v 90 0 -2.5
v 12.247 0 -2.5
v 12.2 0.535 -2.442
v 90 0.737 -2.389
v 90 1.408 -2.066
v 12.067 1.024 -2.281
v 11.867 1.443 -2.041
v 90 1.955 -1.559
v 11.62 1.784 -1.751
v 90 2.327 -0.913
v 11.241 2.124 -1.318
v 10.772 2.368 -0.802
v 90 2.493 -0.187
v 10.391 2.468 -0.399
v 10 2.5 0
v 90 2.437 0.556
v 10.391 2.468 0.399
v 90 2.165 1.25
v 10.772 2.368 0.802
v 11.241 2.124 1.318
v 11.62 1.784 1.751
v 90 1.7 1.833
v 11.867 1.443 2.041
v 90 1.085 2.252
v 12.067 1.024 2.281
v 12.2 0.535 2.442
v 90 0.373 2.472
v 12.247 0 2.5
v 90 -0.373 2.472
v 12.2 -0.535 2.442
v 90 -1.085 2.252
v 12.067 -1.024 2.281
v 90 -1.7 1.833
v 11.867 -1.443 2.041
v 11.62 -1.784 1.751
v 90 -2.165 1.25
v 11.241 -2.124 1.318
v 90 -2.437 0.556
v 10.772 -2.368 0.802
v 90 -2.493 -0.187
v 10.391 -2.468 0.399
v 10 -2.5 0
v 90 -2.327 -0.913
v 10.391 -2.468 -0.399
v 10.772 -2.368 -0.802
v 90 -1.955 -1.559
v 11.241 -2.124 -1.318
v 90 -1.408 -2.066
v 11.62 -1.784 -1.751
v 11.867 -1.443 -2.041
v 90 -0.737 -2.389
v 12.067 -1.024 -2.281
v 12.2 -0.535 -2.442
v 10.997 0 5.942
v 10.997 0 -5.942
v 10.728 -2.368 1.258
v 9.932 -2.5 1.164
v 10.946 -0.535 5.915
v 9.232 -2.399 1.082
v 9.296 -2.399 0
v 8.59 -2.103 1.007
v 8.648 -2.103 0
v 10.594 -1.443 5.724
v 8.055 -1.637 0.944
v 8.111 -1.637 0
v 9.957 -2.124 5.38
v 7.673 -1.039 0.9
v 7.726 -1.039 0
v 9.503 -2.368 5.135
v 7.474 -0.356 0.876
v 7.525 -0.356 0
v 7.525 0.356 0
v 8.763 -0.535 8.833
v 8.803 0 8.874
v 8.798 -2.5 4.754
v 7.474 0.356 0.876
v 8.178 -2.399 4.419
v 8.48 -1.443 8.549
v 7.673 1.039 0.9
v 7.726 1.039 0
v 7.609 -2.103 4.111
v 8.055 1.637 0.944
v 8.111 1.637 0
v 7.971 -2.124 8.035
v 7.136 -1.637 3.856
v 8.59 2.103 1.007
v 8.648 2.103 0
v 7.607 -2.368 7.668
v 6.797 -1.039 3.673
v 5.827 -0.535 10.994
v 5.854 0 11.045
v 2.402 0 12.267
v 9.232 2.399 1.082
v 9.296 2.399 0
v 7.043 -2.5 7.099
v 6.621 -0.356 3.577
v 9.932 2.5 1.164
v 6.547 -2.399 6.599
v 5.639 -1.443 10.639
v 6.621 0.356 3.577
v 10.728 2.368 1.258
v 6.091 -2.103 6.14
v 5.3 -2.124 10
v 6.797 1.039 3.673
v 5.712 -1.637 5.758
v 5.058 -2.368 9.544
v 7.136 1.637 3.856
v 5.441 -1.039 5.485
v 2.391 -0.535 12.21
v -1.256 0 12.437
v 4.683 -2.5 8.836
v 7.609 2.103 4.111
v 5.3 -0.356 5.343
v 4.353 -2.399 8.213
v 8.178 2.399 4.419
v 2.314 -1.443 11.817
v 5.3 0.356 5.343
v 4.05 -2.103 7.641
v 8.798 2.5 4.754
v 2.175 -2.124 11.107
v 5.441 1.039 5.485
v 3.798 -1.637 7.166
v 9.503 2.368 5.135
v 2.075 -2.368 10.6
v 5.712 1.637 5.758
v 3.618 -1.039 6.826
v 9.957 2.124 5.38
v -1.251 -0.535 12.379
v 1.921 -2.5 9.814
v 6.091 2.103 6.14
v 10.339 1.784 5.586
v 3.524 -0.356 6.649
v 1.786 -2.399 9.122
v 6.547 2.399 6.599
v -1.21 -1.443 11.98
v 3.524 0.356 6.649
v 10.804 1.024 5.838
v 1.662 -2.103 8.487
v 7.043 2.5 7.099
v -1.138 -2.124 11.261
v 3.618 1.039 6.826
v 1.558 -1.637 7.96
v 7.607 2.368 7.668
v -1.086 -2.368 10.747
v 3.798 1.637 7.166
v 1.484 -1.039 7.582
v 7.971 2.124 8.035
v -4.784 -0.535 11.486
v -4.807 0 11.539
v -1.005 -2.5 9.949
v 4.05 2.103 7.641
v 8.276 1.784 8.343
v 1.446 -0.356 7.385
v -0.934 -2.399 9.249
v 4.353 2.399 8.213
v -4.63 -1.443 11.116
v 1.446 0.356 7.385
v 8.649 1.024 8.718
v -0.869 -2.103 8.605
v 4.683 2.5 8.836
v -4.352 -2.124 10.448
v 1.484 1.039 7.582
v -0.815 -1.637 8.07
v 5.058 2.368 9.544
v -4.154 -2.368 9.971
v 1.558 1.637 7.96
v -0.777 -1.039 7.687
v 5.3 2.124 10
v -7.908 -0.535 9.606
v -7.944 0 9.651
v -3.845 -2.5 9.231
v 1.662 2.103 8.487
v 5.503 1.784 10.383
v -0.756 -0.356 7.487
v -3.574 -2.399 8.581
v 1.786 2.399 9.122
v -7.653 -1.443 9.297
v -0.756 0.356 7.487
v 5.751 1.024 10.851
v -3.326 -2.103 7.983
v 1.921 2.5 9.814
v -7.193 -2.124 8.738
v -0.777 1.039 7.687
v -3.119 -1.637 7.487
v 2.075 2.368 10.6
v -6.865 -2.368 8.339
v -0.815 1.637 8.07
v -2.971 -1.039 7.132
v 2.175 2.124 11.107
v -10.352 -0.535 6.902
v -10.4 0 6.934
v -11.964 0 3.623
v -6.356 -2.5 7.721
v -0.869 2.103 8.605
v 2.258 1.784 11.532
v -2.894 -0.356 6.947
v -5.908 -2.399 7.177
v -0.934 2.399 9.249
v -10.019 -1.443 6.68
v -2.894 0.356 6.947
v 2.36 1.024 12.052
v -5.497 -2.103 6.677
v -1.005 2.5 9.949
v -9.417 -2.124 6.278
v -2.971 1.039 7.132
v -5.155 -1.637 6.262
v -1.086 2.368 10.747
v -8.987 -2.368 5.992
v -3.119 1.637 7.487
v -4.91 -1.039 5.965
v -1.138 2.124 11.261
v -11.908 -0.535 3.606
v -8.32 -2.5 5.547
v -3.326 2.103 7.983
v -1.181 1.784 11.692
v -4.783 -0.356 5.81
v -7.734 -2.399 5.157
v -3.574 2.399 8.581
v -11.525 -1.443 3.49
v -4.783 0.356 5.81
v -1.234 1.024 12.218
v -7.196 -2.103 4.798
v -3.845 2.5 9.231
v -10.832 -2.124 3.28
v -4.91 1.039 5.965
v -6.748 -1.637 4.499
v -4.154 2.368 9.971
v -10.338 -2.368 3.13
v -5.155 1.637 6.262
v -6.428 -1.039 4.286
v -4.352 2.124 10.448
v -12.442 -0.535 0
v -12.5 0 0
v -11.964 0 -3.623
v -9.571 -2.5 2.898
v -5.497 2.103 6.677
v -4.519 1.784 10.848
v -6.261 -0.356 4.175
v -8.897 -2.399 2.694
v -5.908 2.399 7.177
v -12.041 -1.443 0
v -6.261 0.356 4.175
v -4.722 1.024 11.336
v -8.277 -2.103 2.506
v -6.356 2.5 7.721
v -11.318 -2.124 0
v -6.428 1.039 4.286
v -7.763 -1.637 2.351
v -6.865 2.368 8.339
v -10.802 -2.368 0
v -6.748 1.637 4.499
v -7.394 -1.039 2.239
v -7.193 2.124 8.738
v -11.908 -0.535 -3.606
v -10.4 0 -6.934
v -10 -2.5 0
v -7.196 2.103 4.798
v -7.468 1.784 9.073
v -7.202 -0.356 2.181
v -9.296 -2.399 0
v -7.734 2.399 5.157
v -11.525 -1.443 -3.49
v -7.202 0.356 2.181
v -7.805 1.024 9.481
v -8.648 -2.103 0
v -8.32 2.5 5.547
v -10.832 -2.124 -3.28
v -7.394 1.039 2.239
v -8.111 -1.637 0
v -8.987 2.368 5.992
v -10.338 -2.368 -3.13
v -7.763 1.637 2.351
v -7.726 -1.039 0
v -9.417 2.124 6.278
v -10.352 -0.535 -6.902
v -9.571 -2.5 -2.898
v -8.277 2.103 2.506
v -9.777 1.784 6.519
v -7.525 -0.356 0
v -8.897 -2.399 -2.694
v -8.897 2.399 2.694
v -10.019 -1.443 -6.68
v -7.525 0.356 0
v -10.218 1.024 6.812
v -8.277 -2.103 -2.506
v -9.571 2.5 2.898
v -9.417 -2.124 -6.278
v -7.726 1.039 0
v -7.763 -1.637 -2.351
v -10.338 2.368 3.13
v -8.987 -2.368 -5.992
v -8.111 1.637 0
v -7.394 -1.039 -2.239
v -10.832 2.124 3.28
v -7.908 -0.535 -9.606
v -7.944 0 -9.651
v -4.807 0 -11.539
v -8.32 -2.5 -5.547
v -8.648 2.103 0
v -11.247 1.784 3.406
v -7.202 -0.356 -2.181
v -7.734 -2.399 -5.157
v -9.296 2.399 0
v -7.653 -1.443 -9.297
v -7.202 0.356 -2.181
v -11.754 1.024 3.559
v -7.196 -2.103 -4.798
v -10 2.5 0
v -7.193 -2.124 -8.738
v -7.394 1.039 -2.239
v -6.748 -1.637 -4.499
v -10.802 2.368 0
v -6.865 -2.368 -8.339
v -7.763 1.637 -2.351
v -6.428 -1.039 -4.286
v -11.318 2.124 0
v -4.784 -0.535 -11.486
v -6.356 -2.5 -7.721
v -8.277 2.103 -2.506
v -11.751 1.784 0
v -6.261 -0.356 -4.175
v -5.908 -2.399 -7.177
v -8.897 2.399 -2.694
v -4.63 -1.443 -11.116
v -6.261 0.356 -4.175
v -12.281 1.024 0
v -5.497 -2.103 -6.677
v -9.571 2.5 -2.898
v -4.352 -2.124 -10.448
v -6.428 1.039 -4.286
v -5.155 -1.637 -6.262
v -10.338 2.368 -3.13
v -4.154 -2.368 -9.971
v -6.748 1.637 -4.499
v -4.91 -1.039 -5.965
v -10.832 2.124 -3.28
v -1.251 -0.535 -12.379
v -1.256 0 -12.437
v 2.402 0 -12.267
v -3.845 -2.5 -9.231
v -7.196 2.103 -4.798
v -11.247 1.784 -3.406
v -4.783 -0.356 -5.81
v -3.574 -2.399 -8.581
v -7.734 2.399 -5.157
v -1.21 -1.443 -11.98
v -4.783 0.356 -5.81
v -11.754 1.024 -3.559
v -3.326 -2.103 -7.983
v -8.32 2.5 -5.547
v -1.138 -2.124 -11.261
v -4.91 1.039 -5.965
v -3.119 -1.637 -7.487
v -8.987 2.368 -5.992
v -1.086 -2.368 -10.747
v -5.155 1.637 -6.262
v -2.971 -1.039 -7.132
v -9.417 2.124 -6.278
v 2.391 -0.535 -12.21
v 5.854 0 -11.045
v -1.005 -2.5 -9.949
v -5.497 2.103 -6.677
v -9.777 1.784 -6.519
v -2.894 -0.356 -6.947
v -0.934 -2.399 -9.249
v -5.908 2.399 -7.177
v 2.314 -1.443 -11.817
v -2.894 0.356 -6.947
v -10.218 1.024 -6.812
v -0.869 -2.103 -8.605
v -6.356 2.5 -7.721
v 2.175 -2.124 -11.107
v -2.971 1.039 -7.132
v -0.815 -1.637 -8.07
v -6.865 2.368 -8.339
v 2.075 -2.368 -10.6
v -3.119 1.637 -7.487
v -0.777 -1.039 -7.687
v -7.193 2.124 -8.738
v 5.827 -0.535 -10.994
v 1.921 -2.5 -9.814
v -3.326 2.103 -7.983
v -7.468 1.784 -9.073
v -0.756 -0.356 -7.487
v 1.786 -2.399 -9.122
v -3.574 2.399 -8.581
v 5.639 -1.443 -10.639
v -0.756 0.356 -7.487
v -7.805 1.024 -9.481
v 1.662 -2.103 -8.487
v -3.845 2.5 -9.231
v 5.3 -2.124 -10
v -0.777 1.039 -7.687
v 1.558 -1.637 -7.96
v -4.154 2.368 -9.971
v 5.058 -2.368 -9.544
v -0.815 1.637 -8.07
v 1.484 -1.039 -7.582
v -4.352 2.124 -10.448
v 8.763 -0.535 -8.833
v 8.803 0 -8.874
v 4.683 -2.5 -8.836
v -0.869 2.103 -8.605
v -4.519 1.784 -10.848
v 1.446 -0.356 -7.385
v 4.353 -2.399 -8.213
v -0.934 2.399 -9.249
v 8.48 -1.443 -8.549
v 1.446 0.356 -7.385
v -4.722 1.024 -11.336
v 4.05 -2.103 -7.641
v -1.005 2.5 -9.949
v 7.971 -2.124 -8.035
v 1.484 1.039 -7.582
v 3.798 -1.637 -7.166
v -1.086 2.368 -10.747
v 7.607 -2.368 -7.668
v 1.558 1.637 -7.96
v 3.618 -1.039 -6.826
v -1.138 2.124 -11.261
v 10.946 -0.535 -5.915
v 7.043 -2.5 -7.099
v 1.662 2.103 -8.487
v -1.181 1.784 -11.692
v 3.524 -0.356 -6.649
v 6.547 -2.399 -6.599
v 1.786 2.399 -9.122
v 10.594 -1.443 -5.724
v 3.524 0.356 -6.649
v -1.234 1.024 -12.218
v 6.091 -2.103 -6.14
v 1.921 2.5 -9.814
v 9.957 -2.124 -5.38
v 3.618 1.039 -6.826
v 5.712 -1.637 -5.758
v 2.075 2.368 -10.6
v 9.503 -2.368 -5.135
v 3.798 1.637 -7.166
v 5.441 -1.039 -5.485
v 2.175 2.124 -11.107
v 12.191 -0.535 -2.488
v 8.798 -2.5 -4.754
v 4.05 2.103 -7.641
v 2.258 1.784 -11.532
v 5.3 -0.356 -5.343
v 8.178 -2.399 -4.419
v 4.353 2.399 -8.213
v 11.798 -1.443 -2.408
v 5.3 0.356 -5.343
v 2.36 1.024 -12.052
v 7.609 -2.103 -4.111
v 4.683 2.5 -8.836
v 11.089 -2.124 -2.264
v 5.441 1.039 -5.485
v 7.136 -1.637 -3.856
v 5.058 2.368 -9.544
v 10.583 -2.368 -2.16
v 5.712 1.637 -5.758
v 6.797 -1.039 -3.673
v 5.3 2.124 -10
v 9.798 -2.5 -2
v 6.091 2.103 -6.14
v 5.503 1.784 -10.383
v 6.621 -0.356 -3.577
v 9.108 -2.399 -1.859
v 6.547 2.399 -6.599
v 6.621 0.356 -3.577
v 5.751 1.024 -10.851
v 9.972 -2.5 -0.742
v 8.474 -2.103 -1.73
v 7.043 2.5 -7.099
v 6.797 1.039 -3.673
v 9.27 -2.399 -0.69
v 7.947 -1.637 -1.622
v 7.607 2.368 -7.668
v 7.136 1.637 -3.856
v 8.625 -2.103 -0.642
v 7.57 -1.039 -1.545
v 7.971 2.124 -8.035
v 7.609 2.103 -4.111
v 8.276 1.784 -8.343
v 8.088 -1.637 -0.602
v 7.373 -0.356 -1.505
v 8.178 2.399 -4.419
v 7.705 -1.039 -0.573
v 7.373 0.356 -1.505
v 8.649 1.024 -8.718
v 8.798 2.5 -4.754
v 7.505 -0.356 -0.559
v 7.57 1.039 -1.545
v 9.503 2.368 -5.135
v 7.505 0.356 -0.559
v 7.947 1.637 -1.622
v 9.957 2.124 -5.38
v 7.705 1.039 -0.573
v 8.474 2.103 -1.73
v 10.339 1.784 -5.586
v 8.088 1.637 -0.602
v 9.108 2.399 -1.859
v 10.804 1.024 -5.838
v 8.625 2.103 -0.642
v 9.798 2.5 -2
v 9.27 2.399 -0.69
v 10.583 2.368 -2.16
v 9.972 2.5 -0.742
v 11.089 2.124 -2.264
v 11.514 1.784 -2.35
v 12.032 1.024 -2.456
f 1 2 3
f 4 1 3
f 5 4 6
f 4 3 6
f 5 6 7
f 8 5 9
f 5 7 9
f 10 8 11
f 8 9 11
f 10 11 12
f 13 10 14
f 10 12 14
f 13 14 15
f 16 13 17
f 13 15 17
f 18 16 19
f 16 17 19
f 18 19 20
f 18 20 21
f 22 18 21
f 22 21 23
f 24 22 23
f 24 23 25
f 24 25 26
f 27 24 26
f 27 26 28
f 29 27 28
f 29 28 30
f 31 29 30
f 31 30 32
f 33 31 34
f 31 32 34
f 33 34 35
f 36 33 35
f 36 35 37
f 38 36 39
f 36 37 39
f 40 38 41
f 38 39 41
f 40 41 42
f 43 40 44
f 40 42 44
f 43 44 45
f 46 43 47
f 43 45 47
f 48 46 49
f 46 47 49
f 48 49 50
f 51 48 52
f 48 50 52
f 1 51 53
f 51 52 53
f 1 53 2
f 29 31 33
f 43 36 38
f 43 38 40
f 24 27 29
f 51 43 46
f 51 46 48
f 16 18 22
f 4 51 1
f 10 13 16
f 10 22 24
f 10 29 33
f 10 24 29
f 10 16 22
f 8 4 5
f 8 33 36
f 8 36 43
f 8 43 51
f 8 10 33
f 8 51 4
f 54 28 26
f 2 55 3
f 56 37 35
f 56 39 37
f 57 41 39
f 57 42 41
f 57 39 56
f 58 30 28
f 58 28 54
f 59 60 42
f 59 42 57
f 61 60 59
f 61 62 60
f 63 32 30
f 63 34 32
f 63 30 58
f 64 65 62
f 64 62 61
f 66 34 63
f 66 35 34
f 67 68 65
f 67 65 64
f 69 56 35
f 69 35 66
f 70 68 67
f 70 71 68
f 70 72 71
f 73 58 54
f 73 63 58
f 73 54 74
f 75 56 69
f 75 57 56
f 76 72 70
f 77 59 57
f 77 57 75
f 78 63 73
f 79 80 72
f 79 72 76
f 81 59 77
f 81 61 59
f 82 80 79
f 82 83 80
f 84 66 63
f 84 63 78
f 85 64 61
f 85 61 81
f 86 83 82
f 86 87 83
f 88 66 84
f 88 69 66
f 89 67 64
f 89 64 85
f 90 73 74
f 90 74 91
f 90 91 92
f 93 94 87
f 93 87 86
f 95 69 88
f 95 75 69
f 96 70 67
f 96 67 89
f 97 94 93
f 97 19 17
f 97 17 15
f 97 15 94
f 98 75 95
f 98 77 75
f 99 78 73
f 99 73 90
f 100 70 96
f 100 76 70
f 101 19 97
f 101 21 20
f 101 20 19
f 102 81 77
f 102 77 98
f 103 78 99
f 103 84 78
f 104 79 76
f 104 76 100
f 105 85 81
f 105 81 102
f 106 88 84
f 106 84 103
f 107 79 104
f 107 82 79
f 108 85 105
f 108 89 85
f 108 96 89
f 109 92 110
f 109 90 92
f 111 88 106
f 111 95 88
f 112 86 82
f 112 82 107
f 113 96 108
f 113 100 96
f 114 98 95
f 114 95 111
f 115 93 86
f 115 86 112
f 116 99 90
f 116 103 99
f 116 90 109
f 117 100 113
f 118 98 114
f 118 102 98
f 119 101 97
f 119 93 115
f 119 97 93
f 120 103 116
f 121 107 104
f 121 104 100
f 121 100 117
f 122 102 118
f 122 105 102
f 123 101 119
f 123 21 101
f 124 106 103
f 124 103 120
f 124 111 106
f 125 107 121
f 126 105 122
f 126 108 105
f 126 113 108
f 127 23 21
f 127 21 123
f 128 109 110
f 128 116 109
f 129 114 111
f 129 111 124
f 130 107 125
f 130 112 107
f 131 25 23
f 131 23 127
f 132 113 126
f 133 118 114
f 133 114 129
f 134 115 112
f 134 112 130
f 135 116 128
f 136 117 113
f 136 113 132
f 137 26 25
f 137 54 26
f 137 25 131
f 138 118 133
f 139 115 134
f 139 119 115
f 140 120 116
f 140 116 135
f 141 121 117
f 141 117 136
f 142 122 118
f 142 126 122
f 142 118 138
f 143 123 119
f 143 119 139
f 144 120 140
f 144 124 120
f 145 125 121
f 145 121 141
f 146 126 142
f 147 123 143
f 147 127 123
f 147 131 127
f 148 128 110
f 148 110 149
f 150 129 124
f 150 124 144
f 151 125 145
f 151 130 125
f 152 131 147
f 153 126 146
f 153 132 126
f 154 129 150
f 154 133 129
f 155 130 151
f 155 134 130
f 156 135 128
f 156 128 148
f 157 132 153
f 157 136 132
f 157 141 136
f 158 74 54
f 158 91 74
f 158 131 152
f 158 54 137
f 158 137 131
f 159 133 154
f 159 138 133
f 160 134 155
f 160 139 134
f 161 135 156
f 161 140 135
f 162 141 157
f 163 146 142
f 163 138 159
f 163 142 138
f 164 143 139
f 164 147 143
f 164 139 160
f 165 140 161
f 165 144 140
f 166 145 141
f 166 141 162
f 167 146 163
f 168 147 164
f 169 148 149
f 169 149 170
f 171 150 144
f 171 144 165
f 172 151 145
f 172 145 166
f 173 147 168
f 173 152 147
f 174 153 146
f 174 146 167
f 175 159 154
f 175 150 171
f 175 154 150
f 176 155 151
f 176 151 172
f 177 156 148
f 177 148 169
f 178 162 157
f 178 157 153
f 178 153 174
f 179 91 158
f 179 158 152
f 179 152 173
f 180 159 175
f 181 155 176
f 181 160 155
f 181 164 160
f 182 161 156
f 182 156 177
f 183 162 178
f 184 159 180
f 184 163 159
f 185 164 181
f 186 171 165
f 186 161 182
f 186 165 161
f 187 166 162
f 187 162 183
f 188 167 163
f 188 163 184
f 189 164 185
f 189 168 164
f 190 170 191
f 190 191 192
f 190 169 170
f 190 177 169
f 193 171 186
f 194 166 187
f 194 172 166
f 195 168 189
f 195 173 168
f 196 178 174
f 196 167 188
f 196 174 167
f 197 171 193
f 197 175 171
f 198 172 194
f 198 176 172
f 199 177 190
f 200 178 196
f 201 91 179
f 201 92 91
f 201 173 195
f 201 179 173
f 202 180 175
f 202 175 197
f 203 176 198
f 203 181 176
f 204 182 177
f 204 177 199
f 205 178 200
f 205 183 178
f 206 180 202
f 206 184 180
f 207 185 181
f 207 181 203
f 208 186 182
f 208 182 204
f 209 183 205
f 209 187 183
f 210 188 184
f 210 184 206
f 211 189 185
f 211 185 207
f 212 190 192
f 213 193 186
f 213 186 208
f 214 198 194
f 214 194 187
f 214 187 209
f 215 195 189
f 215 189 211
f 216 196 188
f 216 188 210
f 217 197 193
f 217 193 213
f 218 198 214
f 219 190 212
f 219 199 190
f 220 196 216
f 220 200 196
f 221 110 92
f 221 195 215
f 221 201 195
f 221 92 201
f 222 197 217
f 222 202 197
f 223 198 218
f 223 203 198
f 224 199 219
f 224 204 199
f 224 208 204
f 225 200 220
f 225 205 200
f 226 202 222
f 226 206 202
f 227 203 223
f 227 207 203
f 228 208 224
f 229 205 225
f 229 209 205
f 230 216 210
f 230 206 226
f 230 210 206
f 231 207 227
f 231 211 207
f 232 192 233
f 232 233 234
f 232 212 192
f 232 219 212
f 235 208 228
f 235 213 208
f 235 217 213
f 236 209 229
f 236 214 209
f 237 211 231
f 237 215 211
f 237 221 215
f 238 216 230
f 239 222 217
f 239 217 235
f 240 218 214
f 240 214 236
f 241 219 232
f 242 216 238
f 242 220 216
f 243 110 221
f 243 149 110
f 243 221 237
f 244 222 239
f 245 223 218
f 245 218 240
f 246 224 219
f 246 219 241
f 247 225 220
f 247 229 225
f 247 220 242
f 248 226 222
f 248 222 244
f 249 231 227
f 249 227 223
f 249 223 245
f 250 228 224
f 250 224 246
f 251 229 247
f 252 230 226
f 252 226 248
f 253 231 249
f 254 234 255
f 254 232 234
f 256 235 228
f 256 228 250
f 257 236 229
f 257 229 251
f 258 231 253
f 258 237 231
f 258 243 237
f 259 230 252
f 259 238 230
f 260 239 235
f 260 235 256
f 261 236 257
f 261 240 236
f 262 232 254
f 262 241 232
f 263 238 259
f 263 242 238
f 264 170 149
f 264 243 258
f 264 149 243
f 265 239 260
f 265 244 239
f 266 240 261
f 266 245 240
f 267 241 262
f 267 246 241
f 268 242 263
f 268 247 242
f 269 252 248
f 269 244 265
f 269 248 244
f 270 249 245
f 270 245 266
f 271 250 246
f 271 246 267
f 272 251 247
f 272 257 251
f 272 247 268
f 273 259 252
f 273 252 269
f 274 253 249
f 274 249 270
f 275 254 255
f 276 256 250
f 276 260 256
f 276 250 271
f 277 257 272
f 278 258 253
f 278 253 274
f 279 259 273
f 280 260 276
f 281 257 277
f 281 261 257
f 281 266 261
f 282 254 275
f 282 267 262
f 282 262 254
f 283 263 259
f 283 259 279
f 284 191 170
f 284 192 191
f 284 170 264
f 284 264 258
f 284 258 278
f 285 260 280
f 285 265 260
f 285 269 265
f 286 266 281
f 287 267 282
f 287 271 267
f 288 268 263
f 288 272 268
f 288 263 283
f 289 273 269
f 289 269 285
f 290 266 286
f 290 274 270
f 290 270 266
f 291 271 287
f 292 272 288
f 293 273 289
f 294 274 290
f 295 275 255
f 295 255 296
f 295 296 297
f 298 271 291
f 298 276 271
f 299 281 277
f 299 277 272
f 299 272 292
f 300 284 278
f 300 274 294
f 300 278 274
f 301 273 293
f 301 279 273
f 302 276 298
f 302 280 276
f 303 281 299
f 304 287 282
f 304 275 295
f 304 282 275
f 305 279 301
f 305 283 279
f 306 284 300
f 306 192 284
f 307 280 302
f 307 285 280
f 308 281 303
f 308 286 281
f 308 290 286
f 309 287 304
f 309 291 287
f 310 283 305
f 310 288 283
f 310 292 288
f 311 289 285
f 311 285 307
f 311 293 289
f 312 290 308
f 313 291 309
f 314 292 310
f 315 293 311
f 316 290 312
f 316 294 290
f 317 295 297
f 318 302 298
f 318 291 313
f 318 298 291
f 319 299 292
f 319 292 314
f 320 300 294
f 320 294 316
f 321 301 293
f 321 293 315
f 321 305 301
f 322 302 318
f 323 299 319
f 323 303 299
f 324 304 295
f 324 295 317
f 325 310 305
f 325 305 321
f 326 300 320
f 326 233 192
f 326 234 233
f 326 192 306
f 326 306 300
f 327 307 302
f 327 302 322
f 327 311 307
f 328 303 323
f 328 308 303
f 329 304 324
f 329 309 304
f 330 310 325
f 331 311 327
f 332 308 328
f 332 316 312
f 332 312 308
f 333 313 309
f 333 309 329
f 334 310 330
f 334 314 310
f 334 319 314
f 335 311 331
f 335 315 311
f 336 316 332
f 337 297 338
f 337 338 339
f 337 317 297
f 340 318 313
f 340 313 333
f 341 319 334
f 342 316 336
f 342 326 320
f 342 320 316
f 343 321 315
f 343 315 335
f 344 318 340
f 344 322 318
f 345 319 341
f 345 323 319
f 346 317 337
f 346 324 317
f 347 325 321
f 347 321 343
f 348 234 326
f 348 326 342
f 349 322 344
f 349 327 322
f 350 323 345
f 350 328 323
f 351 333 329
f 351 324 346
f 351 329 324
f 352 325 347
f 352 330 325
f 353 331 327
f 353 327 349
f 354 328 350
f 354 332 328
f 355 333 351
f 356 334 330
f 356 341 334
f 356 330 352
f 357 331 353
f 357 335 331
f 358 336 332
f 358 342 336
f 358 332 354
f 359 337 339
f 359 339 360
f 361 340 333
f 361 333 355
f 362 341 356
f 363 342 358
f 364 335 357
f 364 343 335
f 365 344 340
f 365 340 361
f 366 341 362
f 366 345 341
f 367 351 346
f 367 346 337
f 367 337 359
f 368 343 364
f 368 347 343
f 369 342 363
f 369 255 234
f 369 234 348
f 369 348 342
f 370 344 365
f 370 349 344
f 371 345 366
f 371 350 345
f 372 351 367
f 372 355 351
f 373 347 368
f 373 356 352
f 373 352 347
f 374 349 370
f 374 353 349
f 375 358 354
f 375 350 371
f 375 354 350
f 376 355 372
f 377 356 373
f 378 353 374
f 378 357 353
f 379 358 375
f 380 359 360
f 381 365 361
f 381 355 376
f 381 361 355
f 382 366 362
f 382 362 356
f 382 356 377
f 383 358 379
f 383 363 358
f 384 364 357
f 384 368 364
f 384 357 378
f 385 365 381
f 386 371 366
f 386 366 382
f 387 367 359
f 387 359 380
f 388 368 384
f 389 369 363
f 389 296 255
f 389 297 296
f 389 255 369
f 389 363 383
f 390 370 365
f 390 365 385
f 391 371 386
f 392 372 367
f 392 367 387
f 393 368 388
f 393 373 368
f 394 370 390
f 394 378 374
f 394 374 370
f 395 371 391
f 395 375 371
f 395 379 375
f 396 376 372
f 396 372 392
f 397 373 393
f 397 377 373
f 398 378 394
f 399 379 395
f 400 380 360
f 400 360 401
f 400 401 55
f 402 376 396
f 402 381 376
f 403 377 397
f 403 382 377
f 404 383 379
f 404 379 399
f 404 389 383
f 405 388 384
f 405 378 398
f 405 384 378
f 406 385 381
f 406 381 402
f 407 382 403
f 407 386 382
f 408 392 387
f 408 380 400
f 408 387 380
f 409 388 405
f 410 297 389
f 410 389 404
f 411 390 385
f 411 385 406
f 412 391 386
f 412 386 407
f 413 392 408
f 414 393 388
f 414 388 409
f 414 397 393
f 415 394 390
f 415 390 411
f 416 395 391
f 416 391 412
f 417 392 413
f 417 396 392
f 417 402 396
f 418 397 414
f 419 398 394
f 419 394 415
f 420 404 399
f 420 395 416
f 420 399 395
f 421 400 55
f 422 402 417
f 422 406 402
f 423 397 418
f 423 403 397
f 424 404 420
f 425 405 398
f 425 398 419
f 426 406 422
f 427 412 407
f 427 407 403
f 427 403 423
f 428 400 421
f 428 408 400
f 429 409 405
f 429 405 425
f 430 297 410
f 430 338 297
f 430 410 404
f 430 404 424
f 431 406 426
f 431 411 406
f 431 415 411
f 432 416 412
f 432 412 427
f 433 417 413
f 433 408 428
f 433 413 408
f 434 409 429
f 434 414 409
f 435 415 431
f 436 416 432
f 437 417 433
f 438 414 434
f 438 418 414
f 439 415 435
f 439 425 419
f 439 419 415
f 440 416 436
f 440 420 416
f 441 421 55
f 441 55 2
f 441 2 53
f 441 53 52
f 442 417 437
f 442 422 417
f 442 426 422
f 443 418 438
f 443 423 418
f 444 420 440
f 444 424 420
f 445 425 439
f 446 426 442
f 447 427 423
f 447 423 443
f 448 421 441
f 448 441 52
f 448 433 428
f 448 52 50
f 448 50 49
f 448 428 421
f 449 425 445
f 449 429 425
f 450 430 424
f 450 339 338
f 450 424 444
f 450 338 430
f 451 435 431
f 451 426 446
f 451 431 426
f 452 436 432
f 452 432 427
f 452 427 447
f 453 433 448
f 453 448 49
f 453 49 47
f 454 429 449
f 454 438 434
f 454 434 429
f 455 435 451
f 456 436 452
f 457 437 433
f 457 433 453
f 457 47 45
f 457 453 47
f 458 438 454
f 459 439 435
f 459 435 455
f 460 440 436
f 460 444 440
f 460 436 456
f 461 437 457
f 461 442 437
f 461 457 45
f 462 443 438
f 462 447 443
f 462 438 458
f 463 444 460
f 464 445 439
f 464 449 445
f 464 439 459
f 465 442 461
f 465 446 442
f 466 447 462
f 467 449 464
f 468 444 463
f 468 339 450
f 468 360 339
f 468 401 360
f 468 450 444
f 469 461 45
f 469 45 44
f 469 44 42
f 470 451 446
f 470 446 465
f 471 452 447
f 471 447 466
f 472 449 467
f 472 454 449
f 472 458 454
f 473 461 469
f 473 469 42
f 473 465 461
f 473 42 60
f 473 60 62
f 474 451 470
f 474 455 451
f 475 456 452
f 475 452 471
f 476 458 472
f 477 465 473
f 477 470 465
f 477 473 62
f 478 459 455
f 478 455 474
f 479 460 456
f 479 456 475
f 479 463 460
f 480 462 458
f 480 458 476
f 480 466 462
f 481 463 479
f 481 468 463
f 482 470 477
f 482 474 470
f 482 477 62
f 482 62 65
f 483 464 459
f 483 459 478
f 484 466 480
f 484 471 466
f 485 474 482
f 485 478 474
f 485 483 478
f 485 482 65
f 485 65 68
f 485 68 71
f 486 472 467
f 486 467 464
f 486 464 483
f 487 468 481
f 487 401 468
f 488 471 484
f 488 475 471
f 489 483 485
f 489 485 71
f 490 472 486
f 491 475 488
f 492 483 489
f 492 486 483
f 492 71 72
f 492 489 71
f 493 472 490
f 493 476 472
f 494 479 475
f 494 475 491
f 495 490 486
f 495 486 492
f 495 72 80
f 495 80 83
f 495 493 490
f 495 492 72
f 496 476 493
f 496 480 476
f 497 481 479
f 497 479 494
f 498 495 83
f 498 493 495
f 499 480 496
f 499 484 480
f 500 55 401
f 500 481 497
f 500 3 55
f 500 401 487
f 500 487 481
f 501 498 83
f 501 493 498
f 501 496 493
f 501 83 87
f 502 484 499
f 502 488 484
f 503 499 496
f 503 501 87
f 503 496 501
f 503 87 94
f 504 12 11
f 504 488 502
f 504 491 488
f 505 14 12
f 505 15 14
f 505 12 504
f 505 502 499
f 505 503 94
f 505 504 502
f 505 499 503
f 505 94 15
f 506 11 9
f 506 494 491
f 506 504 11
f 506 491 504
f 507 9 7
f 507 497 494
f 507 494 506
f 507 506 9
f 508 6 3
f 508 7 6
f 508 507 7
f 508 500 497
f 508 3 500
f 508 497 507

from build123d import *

# Parameters (mm, degrees)
TORUS_R              = 2.5
TORUS_ROLL_ANGLE     = 90
CYLINDER_R           = 2.5
CYLINDER_DEPTH       = 80
CYLINDER_PITCH_ANGLE = 90


with BuildPart() as torus:
    # Torus → Torus (revolve)
    with BuildSketch(Plane.XZ):
        with Locations((10, 0)):
            Circle(TORUS_R)
    revolve(axis=Axis((0, 0, 0), (0, 0, 1)))


with BuildPart() as torus_1:
    # Torus roll: moved
    add(torus.part.rotate(Axis((0, 0, 0), (1, 0, 0)), TORUS_ROLL_ANGLE))


with BuildPart() as torus_2:
    # Torus placement: moved
    add(torus_1.part)


with BuildPart() as fusion:
    # Cylinder → Cylinder (new body)
    with BuildSketch(Plane.XY):
        Circle(CYLINDER_R)
    extrude(amount=CYLINDER_DEPTH)


with BuildPart() as fusion_1:
    # Cylinder pitch: moved
    add(fusion.part.rotate(Axis((0, 0, 0), (0, 1, 0)), CYLINDER_PITCH_ANGLE))


with BuildPart() as fusion_2:
    # Cylinder placement: moved
    add(fusion_1.part.moved(Location((10, 0, 0))))

    # Fusion: union Torus
    add(torus_2.part)


solid = fusion_2.part
